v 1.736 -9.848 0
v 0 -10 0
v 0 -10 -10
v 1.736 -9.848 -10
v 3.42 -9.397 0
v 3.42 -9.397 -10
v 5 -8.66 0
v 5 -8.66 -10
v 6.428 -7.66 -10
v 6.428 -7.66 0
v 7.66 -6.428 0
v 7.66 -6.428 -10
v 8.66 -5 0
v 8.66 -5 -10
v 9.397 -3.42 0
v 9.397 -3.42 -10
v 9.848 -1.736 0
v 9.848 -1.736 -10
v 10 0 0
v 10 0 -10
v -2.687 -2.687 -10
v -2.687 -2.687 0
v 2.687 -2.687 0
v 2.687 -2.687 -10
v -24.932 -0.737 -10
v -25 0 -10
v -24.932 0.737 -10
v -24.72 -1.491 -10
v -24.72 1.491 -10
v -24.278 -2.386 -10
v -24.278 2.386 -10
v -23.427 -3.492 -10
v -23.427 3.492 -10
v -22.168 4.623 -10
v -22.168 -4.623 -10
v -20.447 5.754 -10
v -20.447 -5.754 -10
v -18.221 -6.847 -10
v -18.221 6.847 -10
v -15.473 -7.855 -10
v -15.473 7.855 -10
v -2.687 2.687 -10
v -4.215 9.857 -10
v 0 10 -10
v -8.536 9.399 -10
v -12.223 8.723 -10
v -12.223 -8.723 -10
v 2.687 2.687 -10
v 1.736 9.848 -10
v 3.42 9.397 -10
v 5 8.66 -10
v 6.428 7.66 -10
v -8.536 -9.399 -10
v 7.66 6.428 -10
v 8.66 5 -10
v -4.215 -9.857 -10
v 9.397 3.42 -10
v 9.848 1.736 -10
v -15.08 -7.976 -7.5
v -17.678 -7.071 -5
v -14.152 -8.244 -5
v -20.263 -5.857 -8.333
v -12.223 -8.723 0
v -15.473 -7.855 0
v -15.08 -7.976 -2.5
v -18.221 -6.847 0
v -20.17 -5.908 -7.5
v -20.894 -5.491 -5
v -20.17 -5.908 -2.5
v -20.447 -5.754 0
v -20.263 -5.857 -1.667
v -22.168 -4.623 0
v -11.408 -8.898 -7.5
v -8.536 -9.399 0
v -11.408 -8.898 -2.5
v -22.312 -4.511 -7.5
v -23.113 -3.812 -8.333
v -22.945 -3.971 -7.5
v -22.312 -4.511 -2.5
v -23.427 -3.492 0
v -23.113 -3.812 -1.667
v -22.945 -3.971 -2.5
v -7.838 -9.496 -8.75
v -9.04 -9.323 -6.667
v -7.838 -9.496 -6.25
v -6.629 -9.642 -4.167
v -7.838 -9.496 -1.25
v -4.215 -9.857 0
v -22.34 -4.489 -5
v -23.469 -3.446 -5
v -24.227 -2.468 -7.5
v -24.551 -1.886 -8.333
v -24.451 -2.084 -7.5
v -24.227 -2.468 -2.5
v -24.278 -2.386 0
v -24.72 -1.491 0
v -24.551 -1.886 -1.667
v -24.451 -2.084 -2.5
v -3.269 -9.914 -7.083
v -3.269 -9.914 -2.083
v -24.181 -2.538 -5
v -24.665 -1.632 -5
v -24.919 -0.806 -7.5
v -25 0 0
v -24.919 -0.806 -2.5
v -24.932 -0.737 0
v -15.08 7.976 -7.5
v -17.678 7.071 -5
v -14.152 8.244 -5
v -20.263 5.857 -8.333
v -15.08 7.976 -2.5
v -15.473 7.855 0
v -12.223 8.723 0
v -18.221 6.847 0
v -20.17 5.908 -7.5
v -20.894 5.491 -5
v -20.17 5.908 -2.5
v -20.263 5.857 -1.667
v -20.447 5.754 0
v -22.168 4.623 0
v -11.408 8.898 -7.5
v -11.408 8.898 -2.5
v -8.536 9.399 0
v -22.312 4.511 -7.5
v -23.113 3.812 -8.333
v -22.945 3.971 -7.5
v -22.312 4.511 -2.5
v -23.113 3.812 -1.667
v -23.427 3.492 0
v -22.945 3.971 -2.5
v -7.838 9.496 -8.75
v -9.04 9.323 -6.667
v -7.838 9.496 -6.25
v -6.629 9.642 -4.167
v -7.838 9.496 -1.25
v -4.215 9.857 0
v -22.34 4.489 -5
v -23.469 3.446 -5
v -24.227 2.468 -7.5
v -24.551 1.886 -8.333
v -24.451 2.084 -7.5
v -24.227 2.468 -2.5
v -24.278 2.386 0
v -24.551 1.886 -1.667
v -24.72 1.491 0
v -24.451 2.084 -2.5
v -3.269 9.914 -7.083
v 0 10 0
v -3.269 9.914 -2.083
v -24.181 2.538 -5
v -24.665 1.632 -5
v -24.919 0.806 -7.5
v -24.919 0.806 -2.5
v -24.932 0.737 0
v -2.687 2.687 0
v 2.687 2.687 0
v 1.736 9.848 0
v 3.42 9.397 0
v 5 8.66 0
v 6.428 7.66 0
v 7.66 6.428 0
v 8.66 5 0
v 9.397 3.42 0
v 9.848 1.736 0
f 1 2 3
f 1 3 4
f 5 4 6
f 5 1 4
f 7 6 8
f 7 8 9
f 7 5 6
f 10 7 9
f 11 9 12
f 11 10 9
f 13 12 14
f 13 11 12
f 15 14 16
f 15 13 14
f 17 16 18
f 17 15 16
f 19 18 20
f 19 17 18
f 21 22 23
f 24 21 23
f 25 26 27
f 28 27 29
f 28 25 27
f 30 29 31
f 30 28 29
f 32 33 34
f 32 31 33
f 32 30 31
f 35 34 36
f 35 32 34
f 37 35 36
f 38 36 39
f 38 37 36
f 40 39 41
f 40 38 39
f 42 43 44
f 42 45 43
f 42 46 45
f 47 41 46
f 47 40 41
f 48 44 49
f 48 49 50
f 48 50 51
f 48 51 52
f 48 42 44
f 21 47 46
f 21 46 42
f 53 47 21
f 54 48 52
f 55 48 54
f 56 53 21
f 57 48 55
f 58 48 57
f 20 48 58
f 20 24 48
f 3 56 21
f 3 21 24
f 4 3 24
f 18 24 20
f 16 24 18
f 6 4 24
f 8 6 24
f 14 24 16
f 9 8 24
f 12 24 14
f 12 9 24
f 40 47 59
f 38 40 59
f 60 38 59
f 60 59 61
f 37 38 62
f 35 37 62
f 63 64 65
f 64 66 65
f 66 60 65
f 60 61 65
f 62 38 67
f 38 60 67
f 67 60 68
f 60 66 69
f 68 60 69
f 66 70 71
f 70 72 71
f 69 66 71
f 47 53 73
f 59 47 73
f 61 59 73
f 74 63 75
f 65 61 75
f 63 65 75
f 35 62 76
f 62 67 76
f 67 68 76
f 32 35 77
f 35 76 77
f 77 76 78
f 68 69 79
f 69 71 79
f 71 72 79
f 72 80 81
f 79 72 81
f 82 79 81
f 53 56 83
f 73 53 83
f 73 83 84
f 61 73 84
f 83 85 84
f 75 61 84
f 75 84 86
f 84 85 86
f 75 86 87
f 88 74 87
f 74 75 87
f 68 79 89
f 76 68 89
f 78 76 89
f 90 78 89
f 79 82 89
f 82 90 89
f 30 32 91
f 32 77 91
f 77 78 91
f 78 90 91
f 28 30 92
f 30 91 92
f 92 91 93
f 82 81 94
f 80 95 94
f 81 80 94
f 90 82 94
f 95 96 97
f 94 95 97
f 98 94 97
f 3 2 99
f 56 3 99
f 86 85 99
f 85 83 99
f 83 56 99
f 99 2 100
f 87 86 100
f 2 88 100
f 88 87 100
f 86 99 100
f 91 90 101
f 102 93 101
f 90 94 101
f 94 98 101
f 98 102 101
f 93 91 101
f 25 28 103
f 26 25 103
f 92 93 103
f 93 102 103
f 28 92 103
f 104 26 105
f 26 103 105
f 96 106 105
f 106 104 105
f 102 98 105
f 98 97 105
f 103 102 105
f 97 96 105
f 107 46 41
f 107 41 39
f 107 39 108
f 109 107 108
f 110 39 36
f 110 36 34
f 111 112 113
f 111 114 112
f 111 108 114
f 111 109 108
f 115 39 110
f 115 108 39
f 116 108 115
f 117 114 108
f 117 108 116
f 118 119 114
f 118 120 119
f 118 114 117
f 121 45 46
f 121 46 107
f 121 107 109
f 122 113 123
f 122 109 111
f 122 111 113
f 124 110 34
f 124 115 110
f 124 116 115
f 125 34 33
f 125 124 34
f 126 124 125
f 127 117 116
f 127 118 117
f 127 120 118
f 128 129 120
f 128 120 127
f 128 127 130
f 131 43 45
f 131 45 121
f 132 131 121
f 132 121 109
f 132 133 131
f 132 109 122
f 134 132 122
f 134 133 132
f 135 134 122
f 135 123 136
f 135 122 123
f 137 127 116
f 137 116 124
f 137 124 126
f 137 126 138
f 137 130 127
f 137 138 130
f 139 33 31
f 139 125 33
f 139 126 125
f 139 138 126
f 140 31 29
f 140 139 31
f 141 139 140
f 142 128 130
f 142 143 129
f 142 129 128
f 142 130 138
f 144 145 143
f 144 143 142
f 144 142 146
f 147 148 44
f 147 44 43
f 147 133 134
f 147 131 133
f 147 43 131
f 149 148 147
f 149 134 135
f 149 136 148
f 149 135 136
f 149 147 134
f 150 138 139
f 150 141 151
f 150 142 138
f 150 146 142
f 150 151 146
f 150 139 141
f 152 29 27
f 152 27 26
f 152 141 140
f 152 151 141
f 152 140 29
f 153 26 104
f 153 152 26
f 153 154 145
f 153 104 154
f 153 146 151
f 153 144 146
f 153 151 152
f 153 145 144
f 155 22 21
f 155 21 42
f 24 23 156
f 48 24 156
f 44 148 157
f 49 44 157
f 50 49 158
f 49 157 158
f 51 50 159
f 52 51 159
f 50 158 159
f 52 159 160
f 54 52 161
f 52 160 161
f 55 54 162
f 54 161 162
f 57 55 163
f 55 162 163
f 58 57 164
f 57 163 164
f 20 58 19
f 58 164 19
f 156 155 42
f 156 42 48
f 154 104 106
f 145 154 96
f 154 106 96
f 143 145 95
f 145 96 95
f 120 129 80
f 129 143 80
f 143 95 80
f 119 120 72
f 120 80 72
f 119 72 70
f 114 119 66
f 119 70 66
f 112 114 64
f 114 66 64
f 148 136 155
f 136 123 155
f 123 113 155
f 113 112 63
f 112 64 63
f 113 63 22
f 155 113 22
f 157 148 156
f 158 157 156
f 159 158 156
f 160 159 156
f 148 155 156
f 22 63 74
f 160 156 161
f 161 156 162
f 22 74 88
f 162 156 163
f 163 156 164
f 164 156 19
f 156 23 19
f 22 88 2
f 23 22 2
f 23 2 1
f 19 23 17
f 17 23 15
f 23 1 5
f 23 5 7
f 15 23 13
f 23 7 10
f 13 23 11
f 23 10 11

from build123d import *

# Parameters (mm, degrees)
BOSS_EXTRUDE5_DEPTH = 10
SKETCH3_W           = 5.374011538
SKETCH3_H           = 5.374011538
CUT_EXTRUDE2_DEPTH  = 29.722813389


with BuildPart() as part:
    # Sketch5 → Boss-Extrude5 (new body)
    with BuildSketch(Plane.XY):
        with BuildLine():
            Line((0, 0), (-25, 0))
            add(Edge.make_bspline(
                [(0, 10), (-25, 10), (-25, 0)],
                knots=[4.71238898, 4.71238898, 4.71238898, 6.283185307, 6.283185307, 6.283185307], degree=2, weights=[1, 0.707106781, 1]))
            ThreePointArc((0, 10), (7.071067812, 7.071067812), (10, 0))
            Line((10, 0), (0, 0))
        make_face()
    extrude(amount=-BOSS_EXTRUDE5_DEPTH)

    # Mirror2: part across plane


with BuildPart() as part_1:
    add(part.part)
    add(part.part.mirror(Plane(origin=(0, 0, -10), x_dir=(0, 0, 1), z_dir=(0, -1, 0))))

    # Sketch3 → Cut-Extrude2 (cut, through all)
    with BuildSketch(Plane.XY):
        Rectangle(SKETCH3_W, SKETCH3_H)
    extrude(amount=-CUT_EXTRUDE2_DEPTH, mode=Mode.SUBTRACT)


solid = part_1.part
